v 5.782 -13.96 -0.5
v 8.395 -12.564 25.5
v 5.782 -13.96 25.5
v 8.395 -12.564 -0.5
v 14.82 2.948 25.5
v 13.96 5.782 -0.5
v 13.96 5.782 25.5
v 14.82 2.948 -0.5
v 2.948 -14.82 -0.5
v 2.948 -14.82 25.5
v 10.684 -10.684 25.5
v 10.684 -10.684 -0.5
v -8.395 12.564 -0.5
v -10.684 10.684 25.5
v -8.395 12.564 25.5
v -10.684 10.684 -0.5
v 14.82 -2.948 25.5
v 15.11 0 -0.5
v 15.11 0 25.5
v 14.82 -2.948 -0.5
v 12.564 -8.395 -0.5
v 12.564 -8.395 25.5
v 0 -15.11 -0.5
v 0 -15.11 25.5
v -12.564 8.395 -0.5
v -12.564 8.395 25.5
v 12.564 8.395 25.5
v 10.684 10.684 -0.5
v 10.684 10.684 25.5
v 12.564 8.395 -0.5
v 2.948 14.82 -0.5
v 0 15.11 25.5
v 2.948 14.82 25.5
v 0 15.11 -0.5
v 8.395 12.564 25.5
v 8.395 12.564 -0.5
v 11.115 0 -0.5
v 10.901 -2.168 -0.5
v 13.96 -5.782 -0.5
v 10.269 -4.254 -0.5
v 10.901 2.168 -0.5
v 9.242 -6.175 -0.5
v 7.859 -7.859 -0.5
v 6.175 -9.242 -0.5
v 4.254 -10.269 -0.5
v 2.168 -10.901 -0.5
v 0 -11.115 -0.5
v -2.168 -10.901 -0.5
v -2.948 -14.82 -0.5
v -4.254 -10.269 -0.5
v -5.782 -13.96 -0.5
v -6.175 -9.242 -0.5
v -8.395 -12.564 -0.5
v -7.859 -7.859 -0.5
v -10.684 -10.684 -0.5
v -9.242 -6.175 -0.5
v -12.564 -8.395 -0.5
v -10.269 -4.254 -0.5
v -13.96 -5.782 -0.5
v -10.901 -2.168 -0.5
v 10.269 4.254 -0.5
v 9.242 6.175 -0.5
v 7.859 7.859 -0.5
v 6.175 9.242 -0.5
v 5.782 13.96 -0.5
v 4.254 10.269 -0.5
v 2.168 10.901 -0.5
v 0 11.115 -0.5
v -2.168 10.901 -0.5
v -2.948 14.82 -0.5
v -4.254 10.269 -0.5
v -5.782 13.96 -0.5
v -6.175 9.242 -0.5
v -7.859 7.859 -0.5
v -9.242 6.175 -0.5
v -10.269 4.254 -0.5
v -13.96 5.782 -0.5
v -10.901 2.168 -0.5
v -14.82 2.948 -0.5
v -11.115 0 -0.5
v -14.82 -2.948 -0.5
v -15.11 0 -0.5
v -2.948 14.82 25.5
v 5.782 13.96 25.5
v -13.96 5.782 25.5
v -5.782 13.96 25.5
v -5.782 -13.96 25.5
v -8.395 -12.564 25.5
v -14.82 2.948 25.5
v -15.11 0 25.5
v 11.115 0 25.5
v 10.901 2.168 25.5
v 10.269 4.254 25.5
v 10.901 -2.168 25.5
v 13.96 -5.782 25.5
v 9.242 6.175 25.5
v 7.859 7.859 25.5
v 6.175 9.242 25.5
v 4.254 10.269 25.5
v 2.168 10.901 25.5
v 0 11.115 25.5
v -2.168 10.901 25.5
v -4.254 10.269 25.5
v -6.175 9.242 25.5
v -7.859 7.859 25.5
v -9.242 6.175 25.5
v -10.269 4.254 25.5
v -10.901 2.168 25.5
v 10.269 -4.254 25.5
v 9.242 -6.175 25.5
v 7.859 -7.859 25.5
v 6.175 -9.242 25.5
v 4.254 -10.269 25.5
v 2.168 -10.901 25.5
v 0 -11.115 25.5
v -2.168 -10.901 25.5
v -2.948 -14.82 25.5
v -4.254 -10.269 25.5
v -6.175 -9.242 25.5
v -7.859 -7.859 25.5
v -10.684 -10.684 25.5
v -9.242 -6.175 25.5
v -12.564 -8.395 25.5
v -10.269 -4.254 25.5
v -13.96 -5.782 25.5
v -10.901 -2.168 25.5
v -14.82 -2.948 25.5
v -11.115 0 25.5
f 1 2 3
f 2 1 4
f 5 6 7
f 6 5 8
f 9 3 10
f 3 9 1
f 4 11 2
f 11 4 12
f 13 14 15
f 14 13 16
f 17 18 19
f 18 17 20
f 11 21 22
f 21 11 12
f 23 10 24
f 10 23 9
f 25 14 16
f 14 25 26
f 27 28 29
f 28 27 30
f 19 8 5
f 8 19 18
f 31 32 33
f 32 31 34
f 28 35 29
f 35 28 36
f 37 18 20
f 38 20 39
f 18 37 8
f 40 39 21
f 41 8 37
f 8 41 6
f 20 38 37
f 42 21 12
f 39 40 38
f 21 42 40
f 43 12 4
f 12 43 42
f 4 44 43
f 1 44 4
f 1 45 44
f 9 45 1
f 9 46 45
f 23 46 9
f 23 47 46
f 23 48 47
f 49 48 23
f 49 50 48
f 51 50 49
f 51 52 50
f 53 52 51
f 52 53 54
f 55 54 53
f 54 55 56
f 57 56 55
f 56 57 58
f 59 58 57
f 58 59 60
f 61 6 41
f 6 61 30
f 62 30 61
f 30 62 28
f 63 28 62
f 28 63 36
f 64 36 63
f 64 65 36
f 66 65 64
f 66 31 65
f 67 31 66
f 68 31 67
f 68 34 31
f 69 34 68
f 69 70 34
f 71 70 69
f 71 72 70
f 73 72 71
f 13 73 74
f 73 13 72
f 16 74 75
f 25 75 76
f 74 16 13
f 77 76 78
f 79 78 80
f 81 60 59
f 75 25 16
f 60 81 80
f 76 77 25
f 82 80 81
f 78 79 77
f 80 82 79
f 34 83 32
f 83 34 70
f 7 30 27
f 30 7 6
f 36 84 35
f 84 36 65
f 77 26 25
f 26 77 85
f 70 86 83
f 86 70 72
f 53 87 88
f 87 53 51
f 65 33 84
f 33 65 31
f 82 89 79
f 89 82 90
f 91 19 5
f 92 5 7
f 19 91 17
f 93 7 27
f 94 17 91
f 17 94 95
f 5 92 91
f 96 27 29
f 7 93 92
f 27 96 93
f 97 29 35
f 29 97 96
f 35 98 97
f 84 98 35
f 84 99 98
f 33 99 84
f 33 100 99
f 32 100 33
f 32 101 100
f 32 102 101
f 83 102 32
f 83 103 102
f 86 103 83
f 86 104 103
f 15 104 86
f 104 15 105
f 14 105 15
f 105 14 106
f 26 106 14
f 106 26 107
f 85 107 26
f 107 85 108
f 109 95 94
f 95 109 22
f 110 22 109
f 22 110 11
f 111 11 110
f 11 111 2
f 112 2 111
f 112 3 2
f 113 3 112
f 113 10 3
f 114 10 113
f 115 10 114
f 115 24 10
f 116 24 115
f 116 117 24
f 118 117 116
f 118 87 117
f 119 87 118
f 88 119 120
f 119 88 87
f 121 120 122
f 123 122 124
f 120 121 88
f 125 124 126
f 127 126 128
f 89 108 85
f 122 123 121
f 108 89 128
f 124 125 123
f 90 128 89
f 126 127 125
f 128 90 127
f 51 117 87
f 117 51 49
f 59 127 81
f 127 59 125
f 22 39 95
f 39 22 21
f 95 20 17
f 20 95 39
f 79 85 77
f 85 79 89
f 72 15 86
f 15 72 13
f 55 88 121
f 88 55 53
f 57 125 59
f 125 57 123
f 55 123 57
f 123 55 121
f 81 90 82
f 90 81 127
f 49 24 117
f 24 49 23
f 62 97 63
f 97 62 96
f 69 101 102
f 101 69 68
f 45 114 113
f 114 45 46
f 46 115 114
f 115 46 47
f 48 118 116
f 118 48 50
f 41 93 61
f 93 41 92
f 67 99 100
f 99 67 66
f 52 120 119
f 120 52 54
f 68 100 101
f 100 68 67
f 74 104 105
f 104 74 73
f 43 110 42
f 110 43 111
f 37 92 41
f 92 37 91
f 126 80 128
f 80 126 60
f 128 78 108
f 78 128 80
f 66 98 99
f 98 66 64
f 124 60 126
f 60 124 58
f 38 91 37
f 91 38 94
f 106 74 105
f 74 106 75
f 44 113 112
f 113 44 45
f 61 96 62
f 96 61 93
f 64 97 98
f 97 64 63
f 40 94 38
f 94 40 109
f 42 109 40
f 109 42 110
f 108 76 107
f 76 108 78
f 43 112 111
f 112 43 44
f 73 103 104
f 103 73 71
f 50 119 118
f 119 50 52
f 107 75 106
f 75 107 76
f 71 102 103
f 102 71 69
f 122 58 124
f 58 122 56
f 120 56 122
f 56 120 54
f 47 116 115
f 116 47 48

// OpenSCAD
$fn = 32;

// ----------------------------------------------------------------------
// Two-module gear rim: z12 m2 and z12 m2, 25 mm wide
// ----------------------------------------------------------------------

// --- parameters (mm) ---
module_a = 2;             // first tooth module
teeth_a = 12;             // first band tooth count
module_b = 2;             // second tooth module
teeth_b = 12;             // second band tooth count
band_h = 10;              // height of one tooth band
web_t = 5;                // web thickness between the bands
total = 25;               // overall width over both bands
root_r = 9.5;             // root radius of the coarse band
hub_r = 15.11;            // hub radius
bore_d = 22.23;           // hub bore
hole_count = 5;           // lightening holes
hole_r = 7.75;            // lightening hole circle radius
hole_d = 4;               // lightening hole diameter

band_a = [[9.4, -1.378], [12.124, -1.51], [13.058, -1.154], [13.986, -0.621], [13.986, 0.621], [13.058, 1.154], [12.124, 1.51], [9.4, 1.378], [8.829, 3.507], [11.254, 4.755], [11.885, 5.53], [12.423, 6.456], [11.802, 7.531], [10.732, 7.528], [9.745, 7.369], [7.451, 5.893], [5.893, 7.451], [7.369, 9.745], [7.528, 10.732], [7.531, 11.802], [6.456, 12.423], [5.53, 11.885], [4.755, 11.254], [3.507, 8.829], [1.378, 9.4], [1.51, 12.124], [1.154, 13.058], [0.621, 13.986], [-0.621, 13.986], [-1.154, 13.058], [-1.51, 12.124], [-1.378, 9.4], [-3.507, 8.829], [-4.755, 11.254], [-5.53, 11.885], [-6.456, 12.423], [-7.531, 11.802], [-7.528, 10.732], [-7.369, 9.745], [-5.893, 7.451], [-7.451, 5.893], [-9.745, 7.369], [-10.732, 7.528], [-11.802, 7.531], [-12.423, 6.456], [-11.885, 5.53], [-11.254, 4.755], [-8.829, 3.507], [-9.4, 1.378], [-12.124, 1.51], [-13.058, 1.154], [-13.986, 0.621], [-13.986, -0.621], [-13.058, -1.154], [-12.124, -1.51], [-9.4, -1.378], [-8.829, -3.507], [-11.254, -4.755], [-11.885, -5.53], [-12.423, -6.456], [-11.802, -7.531], [-10.732, -7.528], [-9.745, -7.369], [-7.451, -5.893], [-5.893, -7.451], [-7.369, -9.745], [-7.528, -10.732], [-7.531, -11.802], [-6.456, -12.423], [-5.53, -11.885], [-4.755, -11.254], [-3.507, -8.829], [-1.378, -9.4], [-1.51, -12.124], [-1.154, -13.058], [-0.621, -13.986], [0.621, -13.986], [1.154, -13.058], [1.51, -12.124], [1.378, -9.4], [3.507, -8.829], [4.755, -11.254], [5.53, -11.885], [6.456, -12.423], [7.531, -11.802], [7.528, -10.732], [7.369, -9.745], [5.893, -7.451], [7.451, -5.893], [9.745, -7.369], [10.732, -7.528], [11.802, -7.531], [12.423, -6.456], [11.885, -5.53], [11.254, -4.755], [8.829, -3.507]];
band_b = [[9.4, -1.378], [12.124, -1.51], [13.058, -1.154], [13.986, -0.621], [13.986, 0.621], [13.058, 1.154], [12.124, 1.51], [9.4, 1.378], [8.829, 3.507], [11.254, 4.755], [11.885, 5.53], [12.423, 6.456], [11.802, 7.531], [10.732, 7.528], [9.745, 7.369], [7.451, 5.893], [5.893, 7.451], [7.369, 9.745], [7.528, 10.732], [7.531, 11.802], [6.456, 12.423], [5.53, 11.885], [4.755, 11.254], [3.507, 8.829], [1.378, 9.4], [1.51, 12.124], [1.154, 13.058], [0.621, 13.986], [-0.621, 13.986], [-1.154, 13.058], [-1.51, 12.124], [-1.378, 9.4], [-3.507, 8.829], [-4.755, 11.254], [-5.53, 11.885], [-6.456, 12.423], [-7.531, 11.802], [-7.528, 10.732], [-7.369, 9.745], [-5.893, 7.451], [-7.451, 5.893], [-9.745, 7.369], [-10.732, 7.528], [-11.802, 7.531], [-12.423, 6.456], [-11.885, 5.53], [-11.254, 4.755], [-8.829, 3.507], [-9.4, 1.378], [-12.124, 1.51], [-13.058, 1.154], [-13.986, 0.621], [-13.986, -0.621], [-13.058, -1.154], [-12.124, -1.51], [-9.4, -1.378], [-8.829, -3.507], [-11.254, -4.755], [-11.885, -5.53], [-12.423, -6.456], [-11.802, -7.531], [-10.732, -7.528], [-9.745, -7.369], [-7.451, -5.893], [-5.893, -7.451], [-7.369, -9.745], [-7.528, -10.732], [-7.531, -11.802], [-6.456, -12.423], [-5.53, -11.885], [-4.755, -11.254], [-3.507, -8.829], [-1.378, -9.4], [-1.51, -12.124], [-1.154, -13.058], [-0.621, -13.986], [0.621, -13.986], [1.154, -13.058], [1.51, -12.124], [1.378, -9.4], [3.507, -8.829], [4.755, -11.254], [5.53, -11.885], [6.456, -12.423], [7.531, -11.802], [7.528, -10.732], [7.369, -9.745], [5.893, -7.451], [7.451, -5.893], [9.745, -7.369], [10.732, -7.528], [11.802, -7.531], [12.423, -6.456], [11.885, -5.53], [11.254, -4.755], [8.829, -3.507]];

difference() {
  union() {
    /* tooth band A, overlapping the web by 0.4 mm */
    linear_extrude(height = band_h + 0.4) polygon(band_a);
    /* web */
    translate([0, 0, band_h - 0.4]) cylinder(h = web_t + 0.8, d = 2 * root_r);
    /* tooth band B */
    translate([0, 0, band_h + web_t]) linear_extrude(height = band_h + 0.4) polygon(band_b);
    /* hub */
    translate([0, 0, -0.5]) cylinder(h = total + 1.0, d = 2 * hub_r);
  }
  /* bore */
  translate([0, 0, -2.5]) cylinder(h = total + 5, d = bore_d);
  /* lightening holes through the web */
  for (i = [0 : hole_count - 1]) {
    a = i * 360 / hole_count;
    translate([hole_r * cos(a), hole_r * sin(a), -2.5]) cylinder(h = total + 5, d = hole_d);
  }
}
